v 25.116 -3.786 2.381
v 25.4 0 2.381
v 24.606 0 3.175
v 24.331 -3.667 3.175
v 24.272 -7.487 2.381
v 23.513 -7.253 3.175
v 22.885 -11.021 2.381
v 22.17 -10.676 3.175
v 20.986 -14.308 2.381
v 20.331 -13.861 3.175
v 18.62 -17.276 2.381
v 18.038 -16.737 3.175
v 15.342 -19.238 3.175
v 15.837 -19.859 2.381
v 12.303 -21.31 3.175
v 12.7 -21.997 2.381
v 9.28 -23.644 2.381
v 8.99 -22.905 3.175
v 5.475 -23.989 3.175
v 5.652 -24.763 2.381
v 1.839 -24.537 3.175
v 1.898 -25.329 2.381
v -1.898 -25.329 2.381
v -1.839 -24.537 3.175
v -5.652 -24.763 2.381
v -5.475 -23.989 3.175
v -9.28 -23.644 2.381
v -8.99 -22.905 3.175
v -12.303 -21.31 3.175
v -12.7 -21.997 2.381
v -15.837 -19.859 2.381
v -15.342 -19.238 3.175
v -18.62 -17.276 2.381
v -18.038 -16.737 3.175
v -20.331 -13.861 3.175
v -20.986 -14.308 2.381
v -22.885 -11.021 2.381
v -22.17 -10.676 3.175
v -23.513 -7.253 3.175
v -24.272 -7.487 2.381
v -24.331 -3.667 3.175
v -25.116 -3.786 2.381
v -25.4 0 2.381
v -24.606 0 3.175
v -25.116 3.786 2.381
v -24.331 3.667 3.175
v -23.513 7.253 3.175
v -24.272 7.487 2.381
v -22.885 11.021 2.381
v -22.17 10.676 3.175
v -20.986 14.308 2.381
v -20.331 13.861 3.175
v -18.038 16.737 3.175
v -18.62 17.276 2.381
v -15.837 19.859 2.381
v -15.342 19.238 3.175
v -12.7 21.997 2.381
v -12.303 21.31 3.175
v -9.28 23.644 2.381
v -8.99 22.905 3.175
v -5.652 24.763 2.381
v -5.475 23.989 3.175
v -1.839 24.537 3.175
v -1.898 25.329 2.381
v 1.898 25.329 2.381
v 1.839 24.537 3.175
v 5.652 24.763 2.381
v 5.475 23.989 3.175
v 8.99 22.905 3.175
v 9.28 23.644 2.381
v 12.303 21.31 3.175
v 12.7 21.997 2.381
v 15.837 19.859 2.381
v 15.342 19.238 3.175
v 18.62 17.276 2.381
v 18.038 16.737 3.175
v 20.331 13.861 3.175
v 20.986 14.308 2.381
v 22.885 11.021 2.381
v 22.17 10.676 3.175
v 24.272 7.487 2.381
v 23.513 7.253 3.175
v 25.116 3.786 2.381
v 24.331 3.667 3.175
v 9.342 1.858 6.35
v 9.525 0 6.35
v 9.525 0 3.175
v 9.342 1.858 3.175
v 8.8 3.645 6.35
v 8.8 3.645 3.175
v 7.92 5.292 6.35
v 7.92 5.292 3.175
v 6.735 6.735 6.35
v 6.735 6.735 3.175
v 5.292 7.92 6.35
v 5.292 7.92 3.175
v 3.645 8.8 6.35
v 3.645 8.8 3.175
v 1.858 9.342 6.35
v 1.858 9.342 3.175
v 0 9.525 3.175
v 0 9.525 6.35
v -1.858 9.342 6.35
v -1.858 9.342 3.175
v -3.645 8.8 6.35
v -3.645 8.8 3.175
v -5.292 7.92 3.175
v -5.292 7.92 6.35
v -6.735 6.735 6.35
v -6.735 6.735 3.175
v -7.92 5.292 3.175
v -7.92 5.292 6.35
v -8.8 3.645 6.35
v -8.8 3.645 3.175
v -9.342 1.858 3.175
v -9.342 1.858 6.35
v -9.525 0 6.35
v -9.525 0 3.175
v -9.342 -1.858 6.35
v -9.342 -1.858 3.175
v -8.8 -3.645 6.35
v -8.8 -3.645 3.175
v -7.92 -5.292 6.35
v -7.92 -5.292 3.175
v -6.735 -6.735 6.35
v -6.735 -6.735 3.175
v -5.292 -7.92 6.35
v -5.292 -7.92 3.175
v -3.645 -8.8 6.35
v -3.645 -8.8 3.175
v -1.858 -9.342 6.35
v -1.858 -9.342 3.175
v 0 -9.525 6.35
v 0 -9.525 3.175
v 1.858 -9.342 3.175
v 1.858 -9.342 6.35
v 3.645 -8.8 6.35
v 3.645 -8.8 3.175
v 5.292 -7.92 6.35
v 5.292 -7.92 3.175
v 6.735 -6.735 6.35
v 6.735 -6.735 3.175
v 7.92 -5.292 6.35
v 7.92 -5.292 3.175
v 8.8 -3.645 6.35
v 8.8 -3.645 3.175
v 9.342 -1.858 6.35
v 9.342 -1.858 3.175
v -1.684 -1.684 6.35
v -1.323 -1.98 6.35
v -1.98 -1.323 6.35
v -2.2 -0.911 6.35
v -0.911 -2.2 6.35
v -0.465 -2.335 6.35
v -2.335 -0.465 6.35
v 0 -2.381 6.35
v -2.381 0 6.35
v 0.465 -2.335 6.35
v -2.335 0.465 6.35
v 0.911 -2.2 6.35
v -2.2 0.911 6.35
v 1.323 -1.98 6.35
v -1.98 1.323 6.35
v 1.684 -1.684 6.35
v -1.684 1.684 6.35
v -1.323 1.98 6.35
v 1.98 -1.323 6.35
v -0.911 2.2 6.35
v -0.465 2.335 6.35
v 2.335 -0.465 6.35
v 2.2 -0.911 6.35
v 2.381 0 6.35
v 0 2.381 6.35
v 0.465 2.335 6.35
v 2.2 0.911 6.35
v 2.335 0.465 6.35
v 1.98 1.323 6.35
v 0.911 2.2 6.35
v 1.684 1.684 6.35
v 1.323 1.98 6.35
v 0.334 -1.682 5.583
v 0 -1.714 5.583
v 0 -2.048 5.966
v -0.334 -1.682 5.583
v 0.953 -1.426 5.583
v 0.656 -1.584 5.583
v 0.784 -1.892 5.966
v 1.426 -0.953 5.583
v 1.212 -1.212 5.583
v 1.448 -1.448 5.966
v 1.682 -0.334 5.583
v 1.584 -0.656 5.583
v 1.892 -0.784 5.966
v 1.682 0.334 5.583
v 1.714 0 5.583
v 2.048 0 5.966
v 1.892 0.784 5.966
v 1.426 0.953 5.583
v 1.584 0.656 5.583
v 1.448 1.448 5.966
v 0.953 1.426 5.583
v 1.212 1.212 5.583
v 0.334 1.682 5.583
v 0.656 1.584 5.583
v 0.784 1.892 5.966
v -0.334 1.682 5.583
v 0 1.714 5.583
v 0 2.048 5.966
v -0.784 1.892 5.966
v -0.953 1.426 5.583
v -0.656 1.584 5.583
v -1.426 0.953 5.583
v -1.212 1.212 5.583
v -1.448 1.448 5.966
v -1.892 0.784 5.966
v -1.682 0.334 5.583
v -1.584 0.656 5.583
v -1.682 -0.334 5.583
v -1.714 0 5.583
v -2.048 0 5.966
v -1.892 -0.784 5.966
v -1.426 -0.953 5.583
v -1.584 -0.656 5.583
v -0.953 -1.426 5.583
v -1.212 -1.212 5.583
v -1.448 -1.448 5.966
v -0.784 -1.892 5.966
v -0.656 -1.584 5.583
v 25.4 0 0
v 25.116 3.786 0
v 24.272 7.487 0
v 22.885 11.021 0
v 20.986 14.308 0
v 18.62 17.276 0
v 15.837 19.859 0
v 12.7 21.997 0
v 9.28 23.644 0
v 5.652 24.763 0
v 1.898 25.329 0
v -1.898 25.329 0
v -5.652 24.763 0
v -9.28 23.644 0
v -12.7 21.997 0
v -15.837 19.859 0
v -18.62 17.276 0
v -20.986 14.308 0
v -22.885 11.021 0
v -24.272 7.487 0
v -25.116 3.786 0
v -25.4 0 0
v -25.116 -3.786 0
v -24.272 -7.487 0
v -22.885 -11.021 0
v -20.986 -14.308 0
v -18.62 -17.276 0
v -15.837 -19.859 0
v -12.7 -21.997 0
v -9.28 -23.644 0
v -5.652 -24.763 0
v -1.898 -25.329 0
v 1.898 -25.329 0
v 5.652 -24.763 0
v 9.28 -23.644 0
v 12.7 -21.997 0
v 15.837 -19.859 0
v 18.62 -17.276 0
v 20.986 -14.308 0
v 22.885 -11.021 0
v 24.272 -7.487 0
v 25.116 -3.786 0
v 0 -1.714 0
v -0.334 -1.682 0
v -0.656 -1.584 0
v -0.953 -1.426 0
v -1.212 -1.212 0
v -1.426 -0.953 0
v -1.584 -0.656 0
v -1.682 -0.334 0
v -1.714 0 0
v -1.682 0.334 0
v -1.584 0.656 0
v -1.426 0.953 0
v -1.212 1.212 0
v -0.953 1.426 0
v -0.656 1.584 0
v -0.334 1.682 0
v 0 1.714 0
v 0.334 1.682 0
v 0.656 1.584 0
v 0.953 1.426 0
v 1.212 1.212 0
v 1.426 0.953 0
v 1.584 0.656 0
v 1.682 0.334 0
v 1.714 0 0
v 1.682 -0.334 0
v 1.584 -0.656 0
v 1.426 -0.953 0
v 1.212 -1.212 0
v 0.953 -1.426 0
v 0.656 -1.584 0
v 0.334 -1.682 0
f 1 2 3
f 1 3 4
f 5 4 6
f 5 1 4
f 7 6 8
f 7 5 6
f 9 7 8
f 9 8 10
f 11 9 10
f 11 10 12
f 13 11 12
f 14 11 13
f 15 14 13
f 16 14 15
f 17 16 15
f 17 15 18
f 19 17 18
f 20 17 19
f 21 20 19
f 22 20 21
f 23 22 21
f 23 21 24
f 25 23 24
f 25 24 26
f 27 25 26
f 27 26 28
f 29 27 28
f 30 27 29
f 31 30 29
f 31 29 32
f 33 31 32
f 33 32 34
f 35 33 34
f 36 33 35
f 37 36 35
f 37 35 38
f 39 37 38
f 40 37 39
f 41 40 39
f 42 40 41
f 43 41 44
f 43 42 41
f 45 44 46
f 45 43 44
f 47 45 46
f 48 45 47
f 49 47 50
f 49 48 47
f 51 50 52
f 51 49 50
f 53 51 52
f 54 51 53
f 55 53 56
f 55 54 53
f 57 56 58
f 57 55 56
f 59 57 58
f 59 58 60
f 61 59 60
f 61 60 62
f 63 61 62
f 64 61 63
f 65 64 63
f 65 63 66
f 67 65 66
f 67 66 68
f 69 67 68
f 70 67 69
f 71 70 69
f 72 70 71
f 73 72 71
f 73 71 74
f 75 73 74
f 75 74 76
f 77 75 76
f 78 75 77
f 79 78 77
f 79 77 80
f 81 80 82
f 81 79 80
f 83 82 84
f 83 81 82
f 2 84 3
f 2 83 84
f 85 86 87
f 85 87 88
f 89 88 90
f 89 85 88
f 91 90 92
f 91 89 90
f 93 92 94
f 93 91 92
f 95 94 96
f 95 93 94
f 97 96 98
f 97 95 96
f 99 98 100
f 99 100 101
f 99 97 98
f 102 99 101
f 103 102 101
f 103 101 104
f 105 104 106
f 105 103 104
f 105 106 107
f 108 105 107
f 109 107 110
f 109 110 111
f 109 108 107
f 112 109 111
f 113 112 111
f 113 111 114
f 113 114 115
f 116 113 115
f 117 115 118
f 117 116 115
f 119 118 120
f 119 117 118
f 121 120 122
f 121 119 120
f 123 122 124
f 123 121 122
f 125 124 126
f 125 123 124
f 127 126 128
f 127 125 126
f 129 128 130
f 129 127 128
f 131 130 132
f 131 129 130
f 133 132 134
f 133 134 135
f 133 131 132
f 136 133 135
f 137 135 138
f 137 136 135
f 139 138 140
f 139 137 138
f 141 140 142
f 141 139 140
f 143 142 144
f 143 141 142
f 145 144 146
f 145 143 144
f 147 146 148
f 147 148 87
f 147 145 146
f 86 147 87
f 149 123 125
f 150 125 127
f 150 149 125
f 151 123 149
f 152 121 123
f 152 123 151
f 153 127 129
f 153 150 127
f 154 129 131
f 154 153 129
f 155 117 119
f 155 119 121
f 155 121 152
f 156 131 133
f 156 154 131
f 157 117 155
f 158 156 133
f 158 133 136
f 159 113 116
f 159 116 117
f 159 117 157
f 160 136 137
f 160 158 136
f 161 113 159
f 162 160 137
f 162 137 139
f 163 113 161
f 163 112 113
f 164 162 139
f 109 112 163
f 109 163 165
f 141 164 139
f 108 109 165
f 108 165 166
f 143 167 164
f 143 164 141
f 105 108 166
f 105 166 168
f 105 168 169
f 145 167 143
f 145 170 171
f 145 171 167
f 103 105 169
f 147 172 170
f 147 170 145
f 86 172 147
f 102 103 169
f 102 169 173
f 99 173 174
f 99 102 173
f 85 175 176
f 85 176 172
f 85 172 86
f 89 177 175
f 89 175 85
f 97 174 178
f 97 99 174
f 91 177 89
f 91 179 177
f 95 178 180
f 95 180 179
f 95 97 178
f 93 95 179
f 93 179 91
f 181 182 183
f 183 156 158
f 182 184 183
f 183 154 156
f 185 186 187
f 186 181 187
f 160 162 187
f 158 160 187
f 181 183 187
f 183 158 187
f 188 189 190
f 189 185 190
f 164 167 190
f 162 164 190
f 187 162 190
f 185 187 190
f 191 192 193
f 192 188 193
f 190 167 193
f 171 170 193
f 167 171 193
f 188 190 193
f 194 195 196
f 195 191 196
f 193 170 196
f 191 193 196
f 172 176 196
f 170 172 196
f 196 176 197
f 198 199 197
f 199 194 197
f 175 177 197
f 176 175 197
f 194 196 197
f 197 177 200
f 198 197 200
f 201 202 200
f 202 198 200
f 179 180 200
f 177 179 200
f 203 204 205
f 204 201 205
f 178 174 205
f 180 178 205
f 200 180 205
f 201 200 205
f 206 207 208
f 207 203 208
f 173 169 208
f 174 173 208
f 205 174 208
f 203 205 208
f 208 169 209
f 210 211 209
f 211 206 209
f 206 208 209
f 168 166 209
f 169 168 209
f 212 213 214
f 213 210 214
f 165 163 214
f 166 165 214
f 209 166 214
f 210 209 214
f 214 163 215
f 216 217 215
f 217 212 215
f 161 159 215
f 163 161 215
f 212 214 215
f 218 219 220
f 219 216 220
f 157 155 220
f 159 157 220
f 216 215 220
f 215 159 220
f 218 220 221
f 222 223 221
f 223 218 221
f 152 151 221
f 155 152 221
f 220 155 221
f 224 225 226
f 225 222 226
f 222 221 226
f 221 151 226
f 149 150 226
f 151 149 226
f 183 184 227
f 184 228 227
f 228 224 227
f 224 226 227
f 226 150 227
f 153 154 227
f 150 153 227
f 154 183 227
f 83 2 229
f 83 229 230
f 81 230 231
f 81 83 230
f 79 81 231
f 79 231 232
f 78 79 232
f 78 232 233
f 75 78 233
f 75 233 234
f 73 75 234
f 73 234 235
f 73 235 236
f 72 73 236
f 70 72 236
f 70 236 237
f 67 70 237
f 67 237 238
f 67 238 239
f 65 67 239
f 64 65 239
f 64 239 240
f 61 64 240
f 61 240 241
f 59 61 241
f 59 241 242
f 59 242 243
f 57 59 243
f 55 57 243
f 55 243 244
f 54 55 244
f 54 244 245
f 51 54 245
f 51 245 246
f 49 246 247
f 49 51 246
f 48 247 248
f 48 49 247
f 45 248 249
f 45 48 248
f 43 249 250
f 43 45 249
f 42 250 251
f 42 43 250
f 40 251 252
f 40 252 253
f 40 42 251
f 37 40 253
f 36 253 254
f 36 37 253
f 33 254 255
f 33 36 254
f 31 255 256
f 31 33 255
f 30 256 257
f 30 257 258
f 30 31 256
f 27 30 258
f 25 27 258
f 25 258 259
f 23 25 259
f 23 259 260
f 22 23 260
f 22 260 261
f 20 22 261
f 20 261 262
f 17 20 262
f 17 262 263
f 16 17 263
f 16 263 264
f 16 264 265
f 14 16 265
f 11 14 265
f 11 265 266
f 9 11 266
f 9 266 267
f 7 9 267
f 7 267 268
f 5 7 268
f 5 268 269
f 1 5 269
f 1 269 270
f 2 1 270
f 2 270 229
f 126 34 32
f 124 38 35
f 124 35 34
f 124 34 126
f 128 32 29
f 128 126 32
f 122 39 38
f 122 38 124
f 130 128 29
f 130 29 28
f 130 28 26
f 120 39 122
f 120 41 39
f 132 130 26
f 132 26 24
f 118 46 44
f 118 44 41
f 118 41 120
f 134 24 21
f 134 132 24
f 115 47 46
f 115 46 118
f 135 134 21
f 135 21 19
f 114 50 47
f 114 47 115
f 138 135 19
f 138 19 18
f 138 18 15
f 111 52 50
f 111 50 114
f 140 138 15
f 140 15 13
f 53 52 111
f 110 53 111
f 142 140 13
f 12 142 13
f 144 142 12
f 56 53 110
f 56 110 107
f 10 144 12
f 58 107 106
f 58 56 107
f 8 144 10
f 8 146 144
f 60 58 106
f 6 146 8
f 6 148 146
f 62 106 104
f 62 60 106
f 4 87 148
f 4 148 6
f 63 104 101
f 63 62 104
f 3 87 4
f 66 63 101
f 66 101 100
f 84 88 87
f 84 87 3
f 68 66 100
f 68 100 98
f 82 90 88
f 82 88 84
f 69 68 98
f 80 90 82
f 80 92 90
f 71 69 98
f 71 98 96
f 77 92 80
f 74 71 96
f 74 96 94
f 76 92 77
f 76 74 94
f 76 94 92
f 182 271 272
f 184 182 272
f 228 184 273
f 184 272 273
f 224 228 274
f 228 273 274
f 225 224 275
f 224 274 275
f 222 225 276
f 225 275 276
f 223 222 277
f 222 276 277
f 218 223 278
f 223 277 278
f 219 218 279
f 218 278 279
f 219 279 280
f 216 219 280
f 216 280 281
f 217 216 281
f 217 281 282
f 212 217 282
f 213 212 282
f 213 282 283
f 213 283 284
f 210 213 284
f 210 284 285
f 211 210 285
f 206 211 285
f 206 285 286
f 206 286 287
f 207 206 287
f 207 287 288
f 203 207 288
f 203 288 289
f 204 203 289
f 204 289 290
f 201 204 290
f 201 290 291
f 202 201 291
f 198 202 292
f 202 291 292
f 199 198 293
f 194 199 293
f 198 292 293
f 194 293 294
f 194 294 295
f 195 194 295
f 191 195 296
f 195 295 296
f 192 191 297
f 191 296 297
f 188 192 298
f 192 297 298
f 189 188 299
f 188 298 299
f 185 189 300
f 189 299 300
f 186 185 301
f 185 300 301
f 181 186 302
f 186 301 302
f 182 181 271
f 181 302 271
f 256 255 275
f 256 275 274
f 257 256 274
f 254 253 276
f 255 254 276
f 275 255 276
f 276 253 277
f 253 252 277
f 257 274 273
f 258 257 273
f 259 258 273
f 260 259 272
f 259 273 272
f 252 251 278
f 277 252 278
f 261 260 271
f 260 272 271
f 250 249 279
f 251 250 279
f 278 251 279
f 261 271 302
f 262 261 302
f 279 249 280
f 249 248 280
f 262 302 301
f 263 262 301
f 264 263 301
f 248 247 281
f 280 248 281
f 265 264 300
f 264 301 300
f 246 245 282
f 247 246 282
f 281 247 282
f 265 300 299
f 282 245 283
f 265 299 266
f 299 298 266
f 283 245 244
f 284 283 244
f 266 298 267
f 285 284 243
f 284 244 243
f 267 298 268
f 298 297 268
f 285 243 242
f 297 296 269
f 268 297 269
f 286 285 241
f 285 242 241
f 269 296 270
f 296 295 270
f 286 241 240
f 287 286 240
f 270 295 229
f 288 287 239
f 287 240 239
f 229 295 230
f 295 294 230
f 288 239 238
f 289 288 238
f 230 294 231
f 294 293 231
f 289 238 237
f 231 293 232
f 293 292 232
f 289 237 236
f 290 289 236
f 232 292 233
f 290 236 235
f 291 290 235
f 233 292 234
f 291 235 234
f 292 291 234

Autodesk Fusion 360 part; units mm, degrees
cylinder "CylinderPrimitive1" add diameter 50.8 height 3.175 placed x (1, 0, 0) y (0, 1, 0) z (0, 0, 1) at (0, 0, 0) in component "Sandblaster Cabinet pegs"
cylinder "CylinderPrimitive2" add diameter 19.05 height 3.175 placed x (1, 0, 0) y (0, 1, 0) z (0, 0, 1) at (0, 0, 3.175) in component "Sandblaster Cabinet pegs"
hole "Hole1" at (0, 0, 6.35) direction (0, 0, -1) diameter 3.429 end through all countersink diameter 4.7625 countersink angle 82 in component "Sandblaster Cabinet pegs"
chamfer "Chamfer1" distance 0.7937 angle 45 1 edges at (-23.6811, -9.185, 3.175) in component "Sandblaster Cabinet pegs"
component "Sandblaster Cabinet pegs" placed x (1, 0, 0) y (0, 1, 0) z (0, 0, 1) at (0, 0, 0)
equation "d12 = ( 1 / 32 ) * 1 in"
